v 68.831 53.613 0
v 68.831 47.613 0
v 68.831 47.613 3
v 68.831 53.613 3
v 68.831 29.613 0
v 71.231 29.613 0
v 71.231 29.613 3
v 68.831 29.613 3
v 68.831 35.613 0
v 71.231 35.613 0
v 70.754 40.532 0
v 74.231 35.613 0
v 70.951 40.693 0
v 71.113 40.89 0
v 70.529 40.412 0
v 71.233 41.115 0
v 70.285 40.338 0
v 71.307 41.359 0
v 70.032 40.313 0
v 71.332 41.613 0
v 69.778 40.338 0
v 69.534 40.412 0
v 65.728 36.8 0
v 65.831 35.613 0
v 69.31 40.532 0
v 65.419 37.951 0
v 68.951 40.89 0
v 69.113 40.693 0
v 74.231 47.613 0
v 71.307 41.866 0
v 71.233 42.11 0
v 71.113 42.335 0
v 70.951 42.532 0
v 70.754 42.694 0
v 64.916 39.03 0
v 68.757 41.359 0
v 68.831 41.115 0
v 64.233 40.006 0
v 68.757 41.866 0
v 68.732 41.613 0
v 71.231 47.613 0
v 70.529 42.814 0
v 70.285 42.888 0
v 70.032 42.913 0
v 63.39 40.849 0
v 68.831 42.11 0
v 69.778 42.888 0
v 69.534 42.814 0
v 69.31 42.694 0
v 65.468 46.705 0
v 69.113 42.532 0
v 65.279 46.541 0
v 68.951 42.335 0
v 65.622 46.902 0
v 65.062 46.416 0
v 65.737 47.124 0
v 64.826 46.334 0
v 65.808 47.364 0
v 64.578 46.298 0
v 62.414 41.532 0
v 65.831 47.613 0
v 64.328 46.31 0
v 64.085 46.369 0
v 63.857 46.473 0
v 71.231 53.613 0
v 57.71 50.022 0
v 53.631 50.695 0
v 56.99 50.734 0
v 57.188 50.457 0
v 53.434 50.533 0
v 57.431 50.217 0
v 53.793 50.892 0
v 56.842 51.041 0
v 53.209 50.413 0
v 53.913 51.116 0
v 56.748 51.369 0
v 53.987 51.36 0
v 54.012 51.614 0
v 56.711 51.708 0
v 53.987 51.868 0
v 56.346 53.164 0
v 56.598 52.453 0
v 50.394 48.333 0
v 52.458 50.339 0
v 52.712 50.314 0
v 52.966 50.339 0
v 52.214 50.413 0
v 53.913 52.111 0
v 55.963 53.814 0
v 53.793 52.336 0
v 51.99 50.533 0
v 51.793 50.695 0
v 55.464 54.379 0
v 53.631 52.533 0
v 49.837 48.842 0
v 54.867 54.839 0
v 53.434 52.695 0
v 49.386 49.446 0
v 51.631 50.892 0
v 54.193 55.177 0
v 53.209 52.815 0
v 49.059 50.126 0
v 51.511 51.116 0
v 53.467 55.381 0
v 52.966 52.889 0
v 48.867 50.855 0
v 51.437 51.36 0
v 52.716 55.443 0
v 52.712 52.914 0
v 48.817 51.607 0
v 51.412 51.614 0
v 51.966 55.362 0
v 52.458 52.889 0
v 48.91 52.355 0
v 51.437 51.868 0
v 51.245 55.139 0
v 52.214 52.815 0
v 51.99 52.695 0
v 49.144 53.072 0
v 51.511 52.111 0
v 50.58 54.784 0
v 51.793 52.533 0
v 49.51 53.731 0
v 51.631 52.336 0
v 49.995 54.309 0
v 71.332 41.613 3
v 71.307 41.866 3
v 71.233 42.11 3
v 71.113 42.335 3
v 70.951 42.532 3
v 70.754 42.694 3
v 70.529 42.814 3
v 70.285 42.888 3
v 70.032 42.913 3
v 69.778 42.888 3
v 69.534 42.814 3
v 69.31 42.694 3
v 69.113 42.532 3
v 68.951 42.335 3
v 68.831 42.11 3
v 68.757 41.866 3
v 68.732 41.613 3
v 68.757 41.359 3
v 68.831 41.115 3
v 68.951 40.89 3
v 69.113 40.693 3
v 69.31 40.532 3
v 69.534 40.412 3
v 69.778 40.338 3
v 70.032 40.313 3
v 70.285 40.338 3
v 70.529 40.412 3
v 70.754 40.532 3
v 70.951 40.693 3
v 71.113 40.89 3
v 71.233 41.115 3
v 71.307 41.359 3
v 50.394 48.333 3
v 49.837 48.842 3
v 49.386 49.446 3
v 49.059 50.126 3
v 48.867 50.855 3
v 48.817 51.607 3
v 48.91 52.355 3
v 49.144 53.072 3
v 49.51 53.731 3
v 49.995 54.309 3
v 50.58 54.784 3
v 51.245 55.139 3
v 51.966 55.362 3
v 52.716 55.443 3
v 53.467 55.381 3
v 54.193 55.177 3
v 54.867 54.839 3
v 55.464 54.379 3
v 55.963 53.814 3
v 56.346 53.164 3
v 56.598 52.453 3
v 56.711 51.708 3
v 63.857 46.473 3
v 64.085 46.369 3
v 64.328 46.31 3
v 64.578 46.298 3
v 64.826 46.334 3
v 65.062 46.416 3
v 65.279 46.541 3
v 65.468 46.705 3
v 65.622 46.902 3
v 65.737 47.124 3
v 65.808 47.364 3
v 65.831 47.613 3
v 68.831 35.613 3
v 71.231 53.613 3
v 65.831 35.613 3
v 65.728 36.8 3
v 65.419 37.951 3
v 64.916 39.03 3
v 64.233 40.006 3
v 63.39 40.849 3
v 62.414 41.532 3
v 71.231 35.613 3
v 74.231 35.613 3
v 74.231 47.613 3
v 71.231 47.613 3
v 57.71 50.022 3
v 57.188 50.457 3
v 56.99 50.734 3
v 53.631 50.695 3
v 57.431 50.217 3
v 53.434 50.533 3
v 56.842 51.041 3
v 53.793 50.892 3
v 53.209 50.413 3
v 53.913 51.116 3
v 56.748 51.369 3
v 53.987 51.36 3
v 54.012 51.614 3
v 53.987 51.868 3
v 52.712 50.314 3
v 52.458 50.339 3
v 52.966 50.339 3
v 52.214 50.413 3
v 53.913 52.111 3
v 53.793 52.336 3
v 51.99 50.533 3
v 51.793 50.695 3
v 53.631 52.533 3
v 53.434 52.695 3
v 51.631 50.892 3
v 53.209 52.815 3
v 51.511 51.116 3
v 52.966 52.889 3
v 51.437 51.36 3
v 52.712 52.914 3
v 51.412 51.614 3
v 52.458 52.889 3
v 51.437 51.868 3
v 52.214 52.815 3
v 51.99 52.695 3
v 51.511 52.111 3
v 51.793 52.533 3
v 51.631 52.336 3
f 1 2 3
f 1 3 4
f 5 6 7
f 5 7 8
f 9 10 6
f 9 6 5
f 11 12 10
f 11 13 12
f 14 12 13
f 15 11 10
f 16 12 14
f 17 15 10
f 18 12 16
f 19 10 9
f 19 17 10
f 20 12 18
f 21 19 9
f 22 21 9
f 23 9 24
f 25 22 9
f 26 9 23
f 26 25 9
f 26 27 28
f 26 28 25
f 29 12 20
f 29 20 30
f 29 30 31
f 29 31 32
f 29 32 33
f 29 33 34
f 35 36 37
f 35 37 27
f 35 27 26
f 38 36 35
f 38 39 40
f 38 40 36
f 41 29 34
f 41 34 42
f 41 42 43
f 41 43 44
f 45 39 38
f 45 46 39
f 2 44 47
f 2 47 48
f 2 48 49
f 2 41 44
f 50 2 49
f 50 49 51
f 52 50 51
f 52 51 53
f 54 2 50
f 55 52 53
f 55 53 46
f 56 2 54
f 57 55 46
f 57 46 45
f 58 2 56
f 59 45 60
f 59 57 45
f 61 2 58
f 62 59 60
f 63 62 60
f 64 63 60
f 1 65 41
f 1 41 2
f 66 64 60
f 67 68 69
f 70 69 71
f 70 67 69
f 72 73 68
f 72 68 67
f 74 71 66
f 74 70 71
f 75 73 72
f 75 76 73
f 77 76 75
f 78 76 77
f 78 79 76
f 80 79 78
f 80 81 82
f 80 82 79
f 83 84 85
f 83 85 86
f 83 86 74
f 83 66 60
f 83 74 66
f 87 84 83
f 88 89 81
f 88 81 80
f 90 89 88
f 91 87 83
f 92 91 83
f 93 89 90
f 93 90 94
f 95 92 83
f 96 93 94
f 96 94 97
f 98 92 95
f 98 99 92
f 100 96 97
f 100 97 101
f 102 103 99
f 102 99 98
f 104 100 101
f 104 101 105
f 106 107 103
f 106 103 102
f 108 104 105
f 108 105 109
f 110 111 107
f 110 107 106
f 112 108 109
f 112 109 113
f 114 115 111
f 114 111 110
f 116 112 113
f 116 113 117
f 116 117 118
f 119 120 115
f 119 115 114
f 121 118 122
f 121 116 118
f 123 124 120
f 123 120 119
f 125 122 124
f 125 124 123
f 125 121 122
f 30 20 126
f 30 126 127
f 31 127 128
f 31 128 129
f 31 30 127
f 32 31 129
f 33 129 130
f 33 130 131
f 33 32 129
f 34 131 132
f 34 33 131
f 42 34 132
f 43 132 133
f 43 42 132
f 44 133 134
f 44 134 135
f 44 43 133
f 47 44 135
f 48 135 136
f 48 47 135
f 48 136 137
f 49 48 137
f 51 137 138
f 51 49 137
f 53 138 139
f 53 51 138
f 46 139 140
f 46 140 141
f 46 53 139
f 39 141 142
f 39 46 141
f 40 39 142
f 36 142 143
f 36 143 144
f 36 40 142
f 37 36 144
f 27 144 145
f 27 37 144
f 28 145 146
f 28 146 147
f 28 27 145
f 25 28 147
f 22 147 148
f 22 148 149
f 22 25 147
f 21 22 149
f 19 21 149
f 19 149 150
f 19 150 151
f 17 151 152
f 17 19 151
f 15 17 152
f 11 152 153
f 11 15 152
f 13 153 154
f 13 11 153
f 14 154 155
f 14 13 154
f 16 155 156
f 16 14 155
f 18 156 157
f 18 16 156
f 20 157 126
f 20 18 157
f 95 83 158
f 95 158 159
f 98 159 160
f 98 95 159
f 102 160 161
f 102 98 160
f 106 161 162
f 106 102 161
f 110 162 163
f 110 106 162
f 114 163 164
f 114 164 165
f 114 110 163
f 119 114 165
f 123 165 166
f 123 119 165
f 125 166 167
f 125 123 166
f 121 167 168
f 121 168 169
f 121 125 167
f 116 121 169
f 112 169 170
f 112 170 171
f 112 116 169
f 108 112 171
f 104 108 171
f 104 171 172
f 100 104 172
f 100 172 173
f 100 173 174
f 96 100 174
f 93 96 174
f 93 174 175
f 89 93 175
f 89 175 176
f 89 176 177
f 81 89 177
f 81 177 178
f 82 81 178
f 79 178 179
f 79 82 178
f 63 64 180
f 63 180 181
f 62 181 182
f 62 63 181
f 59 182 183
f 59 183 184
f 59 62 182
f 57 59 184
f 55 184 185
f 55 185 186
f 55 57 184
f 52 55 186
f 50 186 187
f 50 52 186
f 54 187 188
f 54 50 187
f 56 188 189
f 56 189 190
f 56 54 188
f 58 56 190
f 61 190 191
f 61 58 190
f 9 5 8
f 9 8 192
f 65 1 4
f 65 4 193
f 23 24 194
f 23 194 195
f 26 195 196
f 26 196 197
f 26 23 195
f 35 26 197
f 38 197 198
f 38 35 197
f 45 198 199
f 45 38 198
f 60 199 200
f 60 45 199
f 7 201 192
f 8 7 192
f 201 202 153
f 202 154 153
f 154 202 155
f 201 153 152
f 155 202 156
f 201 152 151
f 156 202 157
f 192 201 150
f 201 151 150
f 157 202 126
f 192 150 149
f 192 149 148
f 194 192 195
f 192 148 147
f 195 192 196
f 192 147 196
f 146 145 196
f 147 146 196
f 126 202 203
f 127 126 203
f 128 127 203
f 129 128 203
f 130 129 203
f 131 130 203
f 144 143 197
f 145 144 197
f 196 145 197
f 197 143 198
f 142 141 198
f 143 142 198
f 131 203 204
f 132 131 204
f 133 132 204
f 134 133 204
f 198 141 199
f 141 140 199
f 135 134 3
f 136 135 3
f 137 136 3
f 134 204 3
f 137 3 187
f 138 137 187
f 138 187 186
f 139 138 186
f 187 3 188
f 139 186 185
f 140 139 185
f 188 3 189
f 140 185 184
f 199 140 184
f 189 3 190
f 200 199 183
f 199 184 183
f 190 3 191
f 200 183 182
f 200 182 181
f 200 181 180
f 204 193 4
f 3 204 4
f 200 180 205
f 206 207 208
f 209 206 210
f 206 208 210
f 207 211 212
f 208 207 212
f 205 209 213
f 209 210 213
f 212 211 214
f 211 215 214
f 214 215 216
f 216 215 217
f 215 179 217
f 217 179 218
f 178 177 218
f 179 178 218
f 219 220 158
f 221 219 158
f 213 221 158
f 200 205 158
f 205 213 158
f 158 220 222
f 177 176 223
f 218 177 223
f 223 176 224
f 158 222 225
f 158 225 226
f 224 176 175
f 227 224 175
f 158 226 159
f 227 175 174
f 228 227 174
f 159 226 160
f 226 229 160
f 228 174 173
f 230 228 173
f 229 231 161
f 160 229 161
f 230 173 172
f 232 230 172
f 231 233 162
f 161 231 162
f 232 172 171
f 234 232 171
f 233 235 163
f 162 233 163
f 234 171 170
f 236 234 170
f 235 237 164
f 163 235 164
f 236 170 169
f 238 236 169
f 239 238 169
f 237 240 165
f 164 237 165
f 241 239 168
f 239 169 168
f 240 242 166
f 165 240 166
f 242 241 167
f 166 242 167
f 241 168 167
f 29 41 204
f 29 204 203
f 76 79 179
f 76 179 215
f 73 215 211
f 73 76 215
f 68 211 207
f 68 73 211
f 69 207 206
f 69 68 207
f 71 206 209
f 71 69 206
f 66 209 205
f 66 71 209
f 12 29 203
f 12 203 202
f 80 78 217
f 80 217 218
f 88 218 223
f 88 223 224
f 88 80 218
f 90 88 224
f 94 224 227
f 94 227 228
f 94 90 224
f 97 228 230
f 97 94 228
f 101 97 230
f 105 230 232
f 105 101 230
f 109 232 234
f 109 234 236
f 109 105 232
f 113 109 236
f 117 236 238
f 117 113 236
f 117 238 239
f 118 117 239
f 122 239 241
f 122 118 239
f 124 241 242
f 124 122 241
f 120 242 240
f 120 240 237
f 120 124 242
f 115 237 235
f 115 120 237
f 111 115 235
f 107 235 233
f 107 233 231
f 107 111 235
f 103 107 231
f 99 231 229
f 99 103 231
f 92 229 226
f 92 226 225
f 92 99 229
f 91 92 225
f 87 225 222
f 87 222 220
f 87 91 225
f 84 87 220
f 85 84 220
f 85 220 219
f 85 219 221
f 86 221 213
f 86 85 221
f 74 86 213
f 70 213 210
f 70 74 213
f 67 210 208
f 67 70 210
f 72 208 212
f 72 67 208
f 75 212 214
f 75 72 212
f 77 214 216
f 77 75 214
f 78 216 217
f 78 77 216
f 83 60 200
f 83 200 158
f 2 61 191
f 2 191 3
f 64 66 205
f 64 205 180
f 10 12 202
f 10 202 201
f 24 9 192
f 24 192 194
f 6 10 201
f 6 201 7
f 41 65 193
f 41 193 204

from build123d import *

# Parameters (mm, degrees)
MODEL_R             = 1.300004804
MODEL_R_2           = 1.3
BOSS_EXTRUDE1_DEPTH = 3


with BuildPart() as part:
    # Model → Boss-Extrude1 (new body)
    with BuildSketch(Plane.XY):
        with BuildLine():
            ThreePointArc((63.8572156, 46.472930832), (65.173213816, 46.473407151), (65.83136885, 47.613005099))
            Line((65.83136885, 47.613005099), (68.83138654, 47.613005099))
            Line((68.83138654, 47.613005099), (68.83138654, 53.61311115))
            Line((68.83138654, 53.61311115), (71.231386535, 53.61311115))
            Line((71.231386535, 53.61311115), (71.231386535, 47.61311115))
            Line((71.231386535, 47.61311115), (74.231368849, 47.61311115))
            Line((74.231368849, 47.61311115), (74.231368849, 35.61311115))
            Line((74.231368849, 35.61311115), (71.231386533, 35.61311115))
            Line((71.231386533, 35.61311115), (71.231386533, 29.61311115))
            Line((71.231386533, 29.61311115), (68.831386538, 29.61311115))
            Line((68.831386538, 29.61311115), (68.831386538, 35.61293443))
            Line((68.831386538, 35.61293443), (65.831368849, 35.61293443))
            ThreePointArc((65.831368849, 35.61293443), (64.915944961, 39.030436678), (62.414363078, 41.532318088))
            Line((62.414363078, 41.532318088), (50.393576956, 48.333374046))
            ThreePointArc((50.393576956, 48.333374046), (50.904413755, 54.977754044), (56.710901802, 51.707672034))
            ThreePointArc((56.710901802, 51.707672034), (56.990071165, 50.734303435), (57.710211056, 50.022418261))
            Line((57.710211056, 50.022418261), (63.8572156, 46.472930832))
        make_face()
        with Locations((52.711979414, 51.613979963)):
            Circle(MODEL_R, mode=Mode.SUBTRACT)
        with Locations((70.031775439, 41.612672771)):
            Circle(MODEL_R_2, mode=Mode.SUBTRACT)
    extrude(amount=BOSS_EXTRUDE1_DEPTH)


solid = part.part
